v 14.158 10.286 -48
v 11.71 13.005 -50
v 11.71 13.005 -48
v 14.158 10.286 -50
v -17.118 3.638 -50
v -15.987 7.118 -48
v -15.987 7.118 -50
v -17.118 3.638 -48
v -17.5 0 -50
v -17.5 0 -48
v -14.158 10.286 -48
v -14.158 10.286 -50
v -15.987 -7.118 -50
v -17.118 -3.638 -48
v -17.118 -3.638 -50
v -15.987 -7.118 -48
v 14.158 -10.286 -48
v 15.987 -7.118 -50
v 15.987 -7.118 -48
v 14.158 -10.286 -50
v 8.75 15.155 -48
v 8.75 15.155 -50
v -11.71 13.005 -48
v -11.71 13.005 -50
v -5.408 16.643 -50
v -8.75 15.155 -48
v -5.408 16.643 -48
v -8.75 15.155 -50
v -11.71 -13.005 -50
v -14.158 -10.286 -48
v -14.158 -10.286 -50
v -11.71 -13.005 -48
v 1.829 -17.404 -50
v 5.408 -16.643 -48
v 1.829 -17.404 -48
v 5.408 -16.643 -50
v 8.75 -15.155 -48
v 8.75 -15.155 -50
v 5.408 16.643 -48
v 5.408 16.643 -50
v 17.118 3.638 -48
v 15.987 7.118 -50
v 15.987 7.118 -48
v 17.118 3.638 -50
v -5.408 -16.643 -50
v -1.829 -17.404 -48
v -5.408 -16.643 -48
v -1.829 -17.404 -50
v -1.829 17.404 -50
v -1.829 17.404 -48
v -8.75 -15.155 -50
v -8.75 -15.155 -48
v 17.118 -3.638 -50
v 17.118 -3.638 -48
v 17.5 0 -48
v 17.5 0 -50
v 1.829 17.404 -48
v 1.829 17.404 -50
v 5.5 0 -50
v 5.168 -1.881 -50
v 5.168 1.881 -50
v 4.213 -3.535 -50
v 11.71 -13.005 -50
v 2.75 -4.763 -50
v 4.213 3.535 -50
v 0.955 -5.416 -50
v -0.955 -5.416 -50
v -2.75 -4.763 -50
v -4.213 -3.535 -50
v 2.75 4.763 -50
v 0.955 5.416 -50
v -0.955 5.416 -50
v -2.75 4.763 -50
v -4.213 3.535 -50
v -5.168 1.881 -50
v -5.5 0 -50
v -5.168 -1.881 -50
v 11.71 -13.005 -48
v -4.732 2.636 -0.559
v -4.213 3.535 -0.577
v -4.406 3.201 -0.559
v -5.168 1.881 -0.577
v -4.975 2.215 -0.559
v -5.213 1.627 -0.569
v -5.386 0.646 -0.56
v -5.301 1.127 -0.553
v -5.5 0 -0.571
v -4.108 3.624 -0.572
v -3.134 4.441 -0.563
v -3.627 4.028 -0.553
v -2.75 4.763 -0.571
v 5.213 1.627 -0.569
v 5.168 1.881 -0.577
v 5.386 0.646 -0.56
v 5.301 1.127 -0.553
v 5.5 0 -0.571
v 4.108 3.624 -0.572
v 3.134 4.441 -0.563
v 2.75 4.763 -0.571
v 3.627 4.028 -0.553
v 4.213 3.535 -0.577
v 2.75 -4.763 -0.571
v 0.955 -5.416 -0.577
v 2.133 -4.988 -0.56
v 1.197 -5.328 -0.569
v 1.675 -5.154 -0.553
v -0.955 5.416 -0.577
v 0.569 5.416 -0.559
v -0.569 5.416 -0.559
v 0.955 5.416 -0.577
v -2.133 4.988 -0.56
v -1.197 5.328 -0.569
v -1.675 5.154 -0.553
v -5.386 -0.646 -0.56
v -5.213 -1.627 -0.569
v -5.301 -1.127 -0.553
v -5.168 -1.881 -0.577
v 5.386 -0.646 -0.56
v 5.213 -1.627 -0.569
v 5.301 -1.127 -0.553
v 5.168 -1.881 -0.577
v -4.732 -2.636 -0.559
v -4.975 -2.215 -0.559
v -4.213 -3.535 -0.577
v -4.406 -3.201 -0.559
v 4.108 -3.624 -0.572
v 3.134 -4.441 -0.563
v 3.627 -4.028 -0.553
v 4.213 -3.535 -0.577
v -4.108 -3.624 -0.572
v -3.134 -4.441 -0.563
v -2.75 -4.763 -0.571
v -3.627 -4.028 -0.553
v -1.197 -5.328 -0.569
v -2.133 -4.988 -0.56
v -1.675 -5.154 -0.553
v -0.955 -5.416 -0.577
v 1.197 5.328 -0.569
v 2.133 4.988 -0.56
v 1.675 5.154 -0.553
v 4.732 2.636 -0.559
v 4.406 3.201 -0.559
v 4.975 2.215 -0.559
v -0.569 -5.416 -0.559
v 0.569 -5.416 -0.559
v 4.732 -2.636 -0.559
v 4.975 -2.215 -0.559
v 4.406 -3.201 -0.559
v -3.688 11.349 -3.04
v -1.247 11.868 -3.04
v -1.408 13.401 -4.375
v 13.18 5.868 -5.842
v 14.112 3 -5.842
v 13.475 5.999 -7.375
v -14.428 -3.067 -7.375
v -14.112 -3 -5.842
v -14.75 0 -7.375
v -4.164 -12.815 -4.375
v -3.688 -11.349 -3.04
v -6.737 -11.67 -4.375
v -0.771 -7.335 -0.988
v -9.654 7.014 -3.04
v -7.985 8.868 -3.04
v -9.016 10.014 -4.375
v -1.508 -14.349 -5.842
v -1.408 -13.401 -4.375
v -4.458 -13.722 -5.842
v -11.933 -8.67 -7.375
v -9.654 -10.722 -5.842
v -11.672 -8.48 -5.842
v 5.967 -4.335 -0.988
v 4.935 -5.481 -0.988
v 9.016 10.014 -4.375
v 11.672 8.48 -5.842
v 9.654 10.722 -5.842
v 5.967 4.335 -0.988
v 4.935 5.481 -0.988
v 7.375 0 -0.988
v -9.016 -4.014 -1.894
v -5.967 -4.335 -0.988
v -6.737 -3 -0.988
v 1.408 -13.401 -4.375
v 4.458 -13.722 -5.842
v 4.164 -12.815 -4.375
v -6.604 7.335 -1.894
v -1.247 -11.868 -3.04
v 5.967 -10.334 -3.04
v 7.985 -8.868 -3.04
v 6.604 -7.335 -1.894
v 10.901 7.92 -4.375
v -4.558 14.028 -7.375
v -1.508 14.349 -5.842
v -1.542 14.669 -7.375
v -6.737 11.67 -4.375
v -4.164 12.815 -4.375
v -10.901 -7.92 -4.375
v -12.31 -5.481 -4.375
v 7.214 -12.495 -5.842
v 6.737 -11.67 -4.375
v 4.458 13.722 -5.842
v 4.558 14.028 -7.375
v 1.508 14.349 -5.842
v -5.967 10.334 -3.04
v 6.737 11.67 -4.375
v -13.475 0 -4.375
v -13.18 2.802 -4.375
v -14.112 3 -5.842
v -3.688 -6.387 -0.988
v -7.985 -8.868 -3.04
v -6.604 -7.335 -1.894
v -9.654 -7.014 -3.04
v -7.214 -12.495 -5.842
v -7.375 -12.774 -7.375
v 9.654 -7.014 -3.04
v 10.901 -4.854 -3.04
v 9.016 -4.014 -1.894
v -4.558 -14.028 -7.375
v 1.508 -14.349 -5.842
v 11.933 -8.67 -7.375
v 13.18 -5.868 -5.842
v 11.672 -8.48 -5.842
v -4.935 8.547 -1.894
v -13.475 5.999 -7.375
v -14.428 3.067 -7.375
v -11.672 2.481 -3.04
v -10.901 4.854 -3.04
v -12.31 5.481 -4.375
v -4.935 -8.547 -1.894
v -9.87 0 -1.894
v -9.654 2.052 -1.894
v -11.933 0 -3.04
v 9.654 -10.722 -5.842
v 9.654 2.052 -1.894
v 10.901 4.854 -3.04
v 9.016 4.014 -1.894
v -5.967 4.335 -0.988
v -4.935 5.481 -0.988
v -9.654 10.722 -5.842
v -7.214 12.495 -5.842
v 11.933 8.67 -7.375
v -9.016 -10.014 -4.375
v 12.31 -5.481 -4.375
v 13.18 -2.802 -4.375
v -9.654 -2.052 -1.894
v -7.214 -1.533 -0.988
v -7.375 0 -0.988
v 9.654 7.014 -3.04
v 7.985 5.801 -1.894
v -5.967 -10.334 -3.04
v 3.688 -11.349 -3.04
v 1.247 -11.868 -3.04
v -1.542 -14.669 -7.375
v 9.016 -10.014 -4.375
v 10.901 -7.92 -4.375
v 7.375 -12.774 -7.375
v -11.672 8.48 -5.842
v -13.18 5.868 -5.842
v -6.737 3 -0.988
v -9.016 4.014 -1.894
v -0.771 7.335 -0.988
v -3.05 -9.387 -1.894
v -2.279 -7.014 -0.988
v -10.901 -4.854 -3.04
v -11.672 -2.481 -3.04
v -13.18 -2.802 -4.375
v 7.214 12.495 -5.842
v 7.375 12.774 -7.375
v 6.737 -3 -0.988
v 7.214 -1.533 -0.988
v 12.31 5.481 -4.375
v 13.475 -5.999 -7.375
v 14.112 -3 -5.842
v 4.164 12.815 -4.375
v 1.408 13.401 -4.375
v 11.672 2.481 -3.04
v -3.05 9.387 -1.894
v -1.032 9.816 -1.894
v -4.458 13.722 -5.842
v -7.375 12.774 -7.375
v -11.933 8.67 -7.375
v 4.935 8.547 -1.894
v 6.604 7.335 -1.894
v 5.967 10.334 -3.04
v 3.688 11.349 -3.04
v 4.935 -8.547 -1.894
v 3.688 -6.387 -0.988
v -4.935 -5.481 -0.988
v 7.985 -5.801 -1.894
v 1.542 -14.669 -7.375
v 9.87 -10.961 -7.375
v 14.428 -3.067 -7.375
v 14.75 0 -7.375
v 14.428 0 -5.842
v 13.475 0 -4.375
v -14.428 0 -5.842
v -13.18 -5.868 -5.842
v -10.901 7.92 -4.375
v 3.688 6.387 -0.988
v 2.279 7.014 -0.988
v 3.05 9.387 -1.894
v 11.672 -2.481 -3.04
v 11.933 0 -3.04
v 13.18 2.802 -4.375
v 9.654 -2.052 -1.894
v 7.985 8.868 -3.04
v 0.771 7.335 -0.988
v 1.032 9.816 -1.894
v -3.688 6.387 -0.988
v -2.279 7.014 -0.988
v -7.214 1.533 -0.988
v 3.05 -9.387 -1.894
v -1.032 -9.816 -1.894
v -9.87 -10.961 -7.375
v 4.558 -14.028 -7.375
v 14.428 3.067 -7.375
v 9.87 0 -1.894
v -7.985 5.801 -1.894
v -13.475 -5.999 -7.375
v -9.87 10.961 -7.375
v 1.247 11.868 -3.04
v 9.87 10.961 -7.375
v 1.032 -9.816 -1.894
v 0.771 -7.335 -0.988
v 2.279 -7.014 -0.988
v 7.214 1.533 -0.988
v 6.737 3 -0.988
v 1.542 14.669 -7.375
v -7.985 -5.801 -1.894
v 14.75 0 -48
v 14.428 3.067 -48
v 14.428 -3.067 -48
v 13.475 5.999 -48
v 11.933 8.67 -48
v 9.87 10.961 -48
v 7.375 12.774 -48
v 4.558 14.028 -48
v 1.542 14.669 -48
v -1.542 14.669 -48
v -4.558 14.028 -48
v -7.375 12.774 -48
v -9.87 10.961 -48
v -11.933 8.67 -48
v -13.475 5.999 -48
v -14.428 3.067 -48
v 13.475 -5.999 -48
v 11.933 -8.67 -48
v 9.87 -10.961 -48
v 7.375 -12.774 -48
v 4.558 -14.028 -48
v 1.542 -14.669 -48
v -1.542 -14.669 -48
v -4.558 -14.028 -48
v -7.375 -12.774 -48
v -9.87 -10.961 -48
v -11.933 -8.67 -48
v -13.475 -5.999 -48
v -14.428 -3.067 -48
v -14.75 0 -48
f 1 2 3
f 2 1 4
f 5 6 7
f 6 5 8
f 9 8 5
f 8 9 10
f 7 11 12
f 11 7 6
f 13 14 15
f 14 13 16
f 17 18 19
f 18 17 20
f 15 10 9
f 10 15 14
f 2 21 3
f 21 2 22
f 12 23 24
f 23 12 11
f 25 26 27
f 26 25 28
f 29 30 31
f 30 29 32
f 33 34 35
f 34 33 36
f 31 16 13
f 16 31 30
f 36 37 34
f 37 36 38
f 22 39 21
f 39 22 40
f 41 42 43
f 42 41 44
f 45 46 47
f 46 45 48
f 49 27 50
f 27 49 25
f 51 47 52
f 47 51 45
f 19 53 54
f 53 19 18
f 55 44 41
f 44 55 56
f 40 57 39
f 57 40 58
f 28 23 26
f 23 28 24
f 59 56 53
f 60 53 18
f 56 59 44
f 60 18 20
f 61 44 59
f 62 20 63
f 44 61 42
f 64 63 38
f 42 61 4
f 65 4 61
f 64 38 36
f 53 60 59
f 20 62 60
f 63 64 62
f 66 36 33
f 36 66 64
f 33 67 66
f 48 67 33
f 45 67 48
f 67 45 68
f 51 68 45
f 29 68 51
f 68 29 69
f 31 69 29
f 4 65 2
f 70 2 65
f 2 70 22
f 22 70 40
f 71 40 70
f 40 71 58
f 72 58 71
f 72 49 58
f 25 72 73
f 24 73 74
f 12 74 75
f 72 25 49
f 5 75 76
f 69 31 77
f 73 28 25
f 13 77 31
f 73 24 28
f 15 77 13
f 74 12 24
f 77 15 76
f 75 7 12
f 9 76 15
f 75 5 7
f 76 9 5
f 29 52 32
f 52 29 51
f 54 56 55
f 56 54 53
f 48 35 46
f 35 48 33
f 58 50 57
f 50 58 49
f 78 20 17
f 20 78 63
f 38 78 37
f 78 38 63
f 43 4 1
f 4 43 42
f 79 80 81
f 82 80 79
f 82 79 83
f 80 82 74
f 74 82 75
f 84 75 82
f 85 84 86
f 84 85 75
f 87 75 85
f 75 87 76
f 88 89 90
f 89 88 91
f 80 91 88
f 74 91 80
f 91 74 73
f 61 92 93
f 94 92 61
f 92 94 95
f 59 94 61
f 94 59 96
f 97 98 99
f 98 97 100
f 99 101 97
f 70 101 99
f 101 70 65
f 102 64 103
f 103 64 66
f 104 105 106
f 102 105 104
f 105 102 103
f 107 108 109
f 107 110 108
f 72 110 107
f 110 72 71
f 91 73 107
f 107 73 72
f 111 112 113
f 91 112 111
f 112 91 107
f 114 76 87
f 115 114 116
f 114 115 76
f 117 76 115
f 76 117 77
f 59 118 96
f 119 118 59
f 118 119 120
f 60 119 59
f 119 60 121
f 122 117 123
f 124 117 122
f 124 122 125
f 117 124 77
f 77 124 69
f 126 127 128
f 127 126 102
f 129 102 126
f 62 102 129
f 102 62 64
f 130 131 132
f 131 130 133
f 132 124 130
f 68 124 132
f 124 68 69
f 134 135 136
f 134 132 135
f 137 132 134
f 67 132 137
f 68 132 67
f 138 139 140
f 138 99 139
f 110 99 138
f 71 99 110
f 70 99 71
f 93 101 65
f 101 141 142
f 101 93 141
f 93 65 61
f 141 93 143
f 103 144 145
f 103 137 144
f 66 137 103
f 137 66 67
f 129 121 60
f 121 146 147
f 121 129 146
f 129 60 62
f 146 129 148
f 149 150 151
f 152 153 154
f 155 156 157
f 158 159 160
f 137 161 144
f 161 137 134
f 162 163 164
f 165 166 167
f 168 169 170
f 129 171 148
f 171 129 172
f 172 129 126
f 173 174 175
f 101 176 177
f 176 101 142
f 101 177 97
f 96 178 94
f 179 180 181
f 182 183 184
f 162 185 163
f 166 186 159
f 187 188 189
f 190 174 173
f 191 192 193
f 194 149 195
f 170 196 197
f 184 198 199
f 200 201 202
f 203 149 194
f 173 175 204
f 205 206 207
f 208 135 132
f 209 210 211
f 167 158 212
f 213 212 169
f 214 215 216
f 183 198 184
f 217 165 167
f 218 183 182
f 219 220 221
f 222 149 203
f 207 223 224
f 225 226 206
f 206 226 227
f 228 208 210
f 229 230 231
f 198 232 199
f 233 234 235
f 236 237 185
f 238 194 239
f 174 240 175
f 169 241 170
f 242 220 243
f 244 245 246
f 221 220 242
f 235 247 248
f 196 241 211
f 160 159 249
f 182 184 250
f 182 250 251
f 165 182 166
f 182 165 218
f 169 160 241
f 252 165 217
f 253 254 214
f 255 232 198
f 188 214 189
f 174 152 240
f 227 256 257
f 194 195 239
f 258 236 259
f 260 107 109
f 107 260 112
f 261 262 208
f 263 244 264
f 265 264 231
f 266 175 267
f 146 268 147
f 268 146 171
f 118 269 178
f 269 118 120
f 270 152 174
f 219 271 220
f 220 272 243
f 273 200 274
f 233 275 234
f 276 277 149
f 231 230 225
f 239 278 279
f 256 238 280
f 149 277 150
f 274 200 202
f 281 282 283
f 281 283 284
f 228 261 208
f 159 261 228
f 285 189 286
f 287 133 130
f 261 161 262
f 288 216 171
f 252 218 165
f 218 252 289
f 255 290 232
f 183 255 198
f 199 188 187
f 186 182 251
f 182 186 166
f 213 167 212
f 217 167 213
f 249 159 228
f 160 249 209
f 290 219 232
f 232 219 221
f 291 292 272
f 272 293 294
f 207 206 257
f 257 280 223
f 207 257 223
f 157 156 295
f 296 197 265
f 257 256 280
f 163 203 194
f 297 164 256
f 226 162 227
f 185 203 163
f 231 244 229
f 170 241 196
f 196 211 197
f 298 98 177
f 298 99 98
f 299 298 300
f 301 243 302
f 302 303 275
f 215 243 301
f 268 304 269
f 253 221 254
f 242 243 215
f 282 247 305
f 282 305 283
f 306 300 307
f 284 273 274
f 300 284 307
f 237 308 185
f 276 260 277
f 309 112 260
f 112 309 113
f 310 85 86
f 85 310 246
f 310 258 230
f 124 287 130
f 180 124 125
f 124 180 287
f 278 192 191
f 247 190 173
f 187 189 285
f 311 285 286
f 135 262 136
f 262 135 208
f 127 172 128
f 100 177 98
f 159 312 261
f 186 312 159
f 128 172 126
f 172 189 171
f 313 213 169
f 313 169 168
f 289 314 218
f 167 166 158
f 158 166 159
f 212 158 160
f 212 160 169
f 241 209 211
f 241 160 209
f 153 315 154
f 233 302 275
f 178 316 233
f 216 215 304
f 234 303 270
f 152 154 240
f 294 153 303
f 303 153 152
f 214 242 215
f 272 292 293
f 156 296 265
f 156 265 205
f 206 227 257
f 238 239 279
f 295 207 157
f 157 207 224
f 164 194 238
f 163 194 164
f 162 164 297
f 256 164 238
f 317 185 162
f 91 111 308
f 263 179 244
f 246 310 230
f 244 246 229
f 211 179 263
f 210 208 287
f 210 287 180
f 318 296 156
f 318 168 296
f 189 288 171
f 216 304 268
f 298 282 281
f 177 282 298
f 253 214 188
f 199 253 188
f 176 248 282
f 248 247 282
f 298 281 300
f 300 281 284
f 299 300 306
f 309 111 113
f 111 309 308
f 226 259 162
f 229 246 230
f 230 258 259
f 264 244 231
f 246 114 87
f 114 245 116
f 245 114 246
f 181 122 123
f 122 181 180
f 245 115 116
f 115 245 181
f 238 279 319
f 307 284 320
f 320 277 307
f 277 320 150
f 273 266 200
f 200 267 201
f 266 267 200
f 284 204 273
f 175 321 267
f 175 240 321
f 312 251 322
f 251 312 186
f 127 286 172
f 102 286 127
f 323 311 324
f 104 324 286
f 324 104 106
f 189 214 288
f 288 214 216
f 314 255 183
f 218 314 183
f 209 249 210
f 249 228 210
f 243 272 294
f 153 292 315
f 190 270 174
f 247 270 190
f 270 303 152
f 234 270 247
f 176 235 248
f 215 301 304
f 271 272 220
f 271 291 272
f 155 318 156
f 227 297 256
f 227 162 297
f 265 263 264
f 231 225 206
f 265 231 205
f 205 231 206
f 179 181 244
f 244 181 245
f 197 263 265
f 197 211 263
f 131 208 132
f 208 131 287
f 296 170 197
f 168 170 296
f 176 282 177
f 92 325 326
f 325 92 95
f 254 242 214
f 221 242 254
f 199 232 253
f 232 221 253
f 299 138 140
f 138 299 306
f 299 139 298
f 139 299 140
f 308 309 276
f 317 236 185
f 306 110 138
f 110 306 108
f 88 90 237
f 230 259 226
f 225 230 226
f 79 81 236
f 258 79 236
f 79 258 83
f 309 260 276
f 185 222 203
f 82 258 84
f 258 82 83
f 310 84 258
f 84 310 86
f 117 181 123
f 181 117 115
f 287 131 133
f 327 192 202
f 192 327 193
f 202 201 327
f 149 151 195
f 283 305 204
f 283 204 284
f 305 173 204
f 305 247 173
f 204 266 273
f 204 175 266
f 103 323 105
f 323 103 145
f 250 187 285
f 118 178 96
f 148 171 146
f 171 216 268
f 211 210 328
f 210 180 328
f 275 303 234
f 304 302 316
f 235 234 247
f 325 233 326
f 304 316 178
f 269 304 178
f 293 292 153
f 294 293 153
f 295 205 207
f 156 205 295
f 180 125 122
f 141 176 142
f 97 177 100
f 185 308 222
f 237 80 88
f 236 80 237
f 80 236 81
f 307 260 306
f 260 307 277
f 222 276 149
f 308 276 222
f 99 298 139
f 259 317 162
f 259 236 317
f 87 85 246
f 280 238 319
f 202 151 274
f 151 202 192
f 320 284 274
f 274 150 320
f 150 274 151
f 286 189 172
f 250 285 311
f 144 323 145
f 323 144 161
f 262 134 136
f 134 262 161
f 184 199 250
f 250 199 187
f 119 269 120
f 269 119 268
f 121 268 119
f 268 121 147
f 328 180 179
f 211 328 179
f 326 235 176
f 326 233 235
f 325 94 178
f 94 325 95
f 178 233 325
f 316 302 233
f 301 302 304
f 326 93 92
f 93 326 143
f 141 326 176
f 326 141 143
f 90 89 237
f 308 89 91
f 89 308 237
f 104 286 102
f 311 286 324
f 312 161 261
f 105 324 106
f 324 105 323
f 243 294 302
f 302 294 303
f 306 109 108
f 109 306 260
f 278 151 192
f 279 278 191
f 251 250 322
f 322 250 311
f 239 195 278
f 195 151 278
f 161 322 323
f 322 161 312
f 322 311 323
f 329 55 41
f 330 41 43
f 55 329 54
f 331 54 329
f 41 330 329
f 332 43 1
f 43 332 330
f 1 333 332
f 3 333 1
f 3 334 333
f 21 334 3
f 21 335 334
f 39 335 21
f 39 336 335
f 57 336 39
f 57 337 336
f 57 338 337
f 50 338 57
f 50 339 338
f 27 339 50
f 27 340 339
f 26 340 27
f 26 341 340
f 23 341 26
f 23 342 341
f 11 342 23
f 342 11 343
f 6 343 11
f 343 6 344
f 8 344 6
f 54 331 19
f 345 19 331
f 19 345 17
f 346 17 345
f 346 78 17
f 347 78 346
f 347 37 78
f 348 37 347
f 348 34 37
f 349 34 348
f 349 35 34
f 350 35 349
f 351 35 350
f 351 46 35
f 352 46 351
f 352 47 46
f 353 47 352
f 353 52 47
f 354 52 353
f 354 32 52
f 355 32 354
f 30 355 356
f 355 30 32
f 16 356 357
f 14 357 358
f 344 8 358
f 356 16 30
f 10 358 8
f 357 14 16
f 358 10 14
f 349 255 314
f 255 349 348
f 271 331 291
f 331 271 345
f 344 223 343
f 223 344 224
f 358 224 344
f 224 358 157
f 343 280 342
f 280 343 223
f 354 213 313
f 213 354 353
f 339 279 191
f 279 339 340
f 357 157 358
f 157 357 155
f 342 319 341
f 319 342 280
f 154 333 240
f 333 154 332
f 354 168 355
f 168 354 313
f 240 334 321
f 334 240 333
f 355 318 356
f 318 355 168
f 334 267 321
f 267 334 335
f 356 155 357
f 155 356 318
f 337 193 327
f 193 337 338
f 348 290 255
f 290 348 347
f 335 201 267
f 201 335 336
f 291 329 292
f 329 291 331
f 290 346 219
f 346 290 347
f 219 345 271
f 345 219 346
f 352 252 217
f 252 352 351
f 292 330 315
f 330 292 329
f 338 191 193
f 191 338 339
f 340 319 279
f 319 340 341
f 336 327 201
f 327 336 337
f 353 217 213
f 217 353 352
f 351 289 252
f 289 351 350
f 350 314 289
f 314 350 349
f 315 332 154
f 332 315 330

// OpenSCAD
// A tube fused with an oblate ellipsoid, then cut by a ring whose inner
// radius equals the ellipsoid's, so the ellipsoid is trimmed exactly at
// its equator. Splitting that face at its seam produced a STEP file that
// read back 55% too large; the unsplit file reads back exactly.
module ring(id, od, h) { difference() { cylinder(r = od / 2, h = h); translate([0, 0, -0.01]) cylinder(r = id / 2, h = h + 0.02); } }
rotate([0, 180, 0]) difference() {
  union() {
    translate([0, 0, 7.375]) {
      ring(id = 11, od = 35, h = 42.625);
      difference() { scale([1, 1, 0.5]) sphere(r = 14.75); cylinder(r = 5.5, h = 16.75, center = true); }
    }
  }
  ring(id = 29.5, od = 36, h = 48);
}
